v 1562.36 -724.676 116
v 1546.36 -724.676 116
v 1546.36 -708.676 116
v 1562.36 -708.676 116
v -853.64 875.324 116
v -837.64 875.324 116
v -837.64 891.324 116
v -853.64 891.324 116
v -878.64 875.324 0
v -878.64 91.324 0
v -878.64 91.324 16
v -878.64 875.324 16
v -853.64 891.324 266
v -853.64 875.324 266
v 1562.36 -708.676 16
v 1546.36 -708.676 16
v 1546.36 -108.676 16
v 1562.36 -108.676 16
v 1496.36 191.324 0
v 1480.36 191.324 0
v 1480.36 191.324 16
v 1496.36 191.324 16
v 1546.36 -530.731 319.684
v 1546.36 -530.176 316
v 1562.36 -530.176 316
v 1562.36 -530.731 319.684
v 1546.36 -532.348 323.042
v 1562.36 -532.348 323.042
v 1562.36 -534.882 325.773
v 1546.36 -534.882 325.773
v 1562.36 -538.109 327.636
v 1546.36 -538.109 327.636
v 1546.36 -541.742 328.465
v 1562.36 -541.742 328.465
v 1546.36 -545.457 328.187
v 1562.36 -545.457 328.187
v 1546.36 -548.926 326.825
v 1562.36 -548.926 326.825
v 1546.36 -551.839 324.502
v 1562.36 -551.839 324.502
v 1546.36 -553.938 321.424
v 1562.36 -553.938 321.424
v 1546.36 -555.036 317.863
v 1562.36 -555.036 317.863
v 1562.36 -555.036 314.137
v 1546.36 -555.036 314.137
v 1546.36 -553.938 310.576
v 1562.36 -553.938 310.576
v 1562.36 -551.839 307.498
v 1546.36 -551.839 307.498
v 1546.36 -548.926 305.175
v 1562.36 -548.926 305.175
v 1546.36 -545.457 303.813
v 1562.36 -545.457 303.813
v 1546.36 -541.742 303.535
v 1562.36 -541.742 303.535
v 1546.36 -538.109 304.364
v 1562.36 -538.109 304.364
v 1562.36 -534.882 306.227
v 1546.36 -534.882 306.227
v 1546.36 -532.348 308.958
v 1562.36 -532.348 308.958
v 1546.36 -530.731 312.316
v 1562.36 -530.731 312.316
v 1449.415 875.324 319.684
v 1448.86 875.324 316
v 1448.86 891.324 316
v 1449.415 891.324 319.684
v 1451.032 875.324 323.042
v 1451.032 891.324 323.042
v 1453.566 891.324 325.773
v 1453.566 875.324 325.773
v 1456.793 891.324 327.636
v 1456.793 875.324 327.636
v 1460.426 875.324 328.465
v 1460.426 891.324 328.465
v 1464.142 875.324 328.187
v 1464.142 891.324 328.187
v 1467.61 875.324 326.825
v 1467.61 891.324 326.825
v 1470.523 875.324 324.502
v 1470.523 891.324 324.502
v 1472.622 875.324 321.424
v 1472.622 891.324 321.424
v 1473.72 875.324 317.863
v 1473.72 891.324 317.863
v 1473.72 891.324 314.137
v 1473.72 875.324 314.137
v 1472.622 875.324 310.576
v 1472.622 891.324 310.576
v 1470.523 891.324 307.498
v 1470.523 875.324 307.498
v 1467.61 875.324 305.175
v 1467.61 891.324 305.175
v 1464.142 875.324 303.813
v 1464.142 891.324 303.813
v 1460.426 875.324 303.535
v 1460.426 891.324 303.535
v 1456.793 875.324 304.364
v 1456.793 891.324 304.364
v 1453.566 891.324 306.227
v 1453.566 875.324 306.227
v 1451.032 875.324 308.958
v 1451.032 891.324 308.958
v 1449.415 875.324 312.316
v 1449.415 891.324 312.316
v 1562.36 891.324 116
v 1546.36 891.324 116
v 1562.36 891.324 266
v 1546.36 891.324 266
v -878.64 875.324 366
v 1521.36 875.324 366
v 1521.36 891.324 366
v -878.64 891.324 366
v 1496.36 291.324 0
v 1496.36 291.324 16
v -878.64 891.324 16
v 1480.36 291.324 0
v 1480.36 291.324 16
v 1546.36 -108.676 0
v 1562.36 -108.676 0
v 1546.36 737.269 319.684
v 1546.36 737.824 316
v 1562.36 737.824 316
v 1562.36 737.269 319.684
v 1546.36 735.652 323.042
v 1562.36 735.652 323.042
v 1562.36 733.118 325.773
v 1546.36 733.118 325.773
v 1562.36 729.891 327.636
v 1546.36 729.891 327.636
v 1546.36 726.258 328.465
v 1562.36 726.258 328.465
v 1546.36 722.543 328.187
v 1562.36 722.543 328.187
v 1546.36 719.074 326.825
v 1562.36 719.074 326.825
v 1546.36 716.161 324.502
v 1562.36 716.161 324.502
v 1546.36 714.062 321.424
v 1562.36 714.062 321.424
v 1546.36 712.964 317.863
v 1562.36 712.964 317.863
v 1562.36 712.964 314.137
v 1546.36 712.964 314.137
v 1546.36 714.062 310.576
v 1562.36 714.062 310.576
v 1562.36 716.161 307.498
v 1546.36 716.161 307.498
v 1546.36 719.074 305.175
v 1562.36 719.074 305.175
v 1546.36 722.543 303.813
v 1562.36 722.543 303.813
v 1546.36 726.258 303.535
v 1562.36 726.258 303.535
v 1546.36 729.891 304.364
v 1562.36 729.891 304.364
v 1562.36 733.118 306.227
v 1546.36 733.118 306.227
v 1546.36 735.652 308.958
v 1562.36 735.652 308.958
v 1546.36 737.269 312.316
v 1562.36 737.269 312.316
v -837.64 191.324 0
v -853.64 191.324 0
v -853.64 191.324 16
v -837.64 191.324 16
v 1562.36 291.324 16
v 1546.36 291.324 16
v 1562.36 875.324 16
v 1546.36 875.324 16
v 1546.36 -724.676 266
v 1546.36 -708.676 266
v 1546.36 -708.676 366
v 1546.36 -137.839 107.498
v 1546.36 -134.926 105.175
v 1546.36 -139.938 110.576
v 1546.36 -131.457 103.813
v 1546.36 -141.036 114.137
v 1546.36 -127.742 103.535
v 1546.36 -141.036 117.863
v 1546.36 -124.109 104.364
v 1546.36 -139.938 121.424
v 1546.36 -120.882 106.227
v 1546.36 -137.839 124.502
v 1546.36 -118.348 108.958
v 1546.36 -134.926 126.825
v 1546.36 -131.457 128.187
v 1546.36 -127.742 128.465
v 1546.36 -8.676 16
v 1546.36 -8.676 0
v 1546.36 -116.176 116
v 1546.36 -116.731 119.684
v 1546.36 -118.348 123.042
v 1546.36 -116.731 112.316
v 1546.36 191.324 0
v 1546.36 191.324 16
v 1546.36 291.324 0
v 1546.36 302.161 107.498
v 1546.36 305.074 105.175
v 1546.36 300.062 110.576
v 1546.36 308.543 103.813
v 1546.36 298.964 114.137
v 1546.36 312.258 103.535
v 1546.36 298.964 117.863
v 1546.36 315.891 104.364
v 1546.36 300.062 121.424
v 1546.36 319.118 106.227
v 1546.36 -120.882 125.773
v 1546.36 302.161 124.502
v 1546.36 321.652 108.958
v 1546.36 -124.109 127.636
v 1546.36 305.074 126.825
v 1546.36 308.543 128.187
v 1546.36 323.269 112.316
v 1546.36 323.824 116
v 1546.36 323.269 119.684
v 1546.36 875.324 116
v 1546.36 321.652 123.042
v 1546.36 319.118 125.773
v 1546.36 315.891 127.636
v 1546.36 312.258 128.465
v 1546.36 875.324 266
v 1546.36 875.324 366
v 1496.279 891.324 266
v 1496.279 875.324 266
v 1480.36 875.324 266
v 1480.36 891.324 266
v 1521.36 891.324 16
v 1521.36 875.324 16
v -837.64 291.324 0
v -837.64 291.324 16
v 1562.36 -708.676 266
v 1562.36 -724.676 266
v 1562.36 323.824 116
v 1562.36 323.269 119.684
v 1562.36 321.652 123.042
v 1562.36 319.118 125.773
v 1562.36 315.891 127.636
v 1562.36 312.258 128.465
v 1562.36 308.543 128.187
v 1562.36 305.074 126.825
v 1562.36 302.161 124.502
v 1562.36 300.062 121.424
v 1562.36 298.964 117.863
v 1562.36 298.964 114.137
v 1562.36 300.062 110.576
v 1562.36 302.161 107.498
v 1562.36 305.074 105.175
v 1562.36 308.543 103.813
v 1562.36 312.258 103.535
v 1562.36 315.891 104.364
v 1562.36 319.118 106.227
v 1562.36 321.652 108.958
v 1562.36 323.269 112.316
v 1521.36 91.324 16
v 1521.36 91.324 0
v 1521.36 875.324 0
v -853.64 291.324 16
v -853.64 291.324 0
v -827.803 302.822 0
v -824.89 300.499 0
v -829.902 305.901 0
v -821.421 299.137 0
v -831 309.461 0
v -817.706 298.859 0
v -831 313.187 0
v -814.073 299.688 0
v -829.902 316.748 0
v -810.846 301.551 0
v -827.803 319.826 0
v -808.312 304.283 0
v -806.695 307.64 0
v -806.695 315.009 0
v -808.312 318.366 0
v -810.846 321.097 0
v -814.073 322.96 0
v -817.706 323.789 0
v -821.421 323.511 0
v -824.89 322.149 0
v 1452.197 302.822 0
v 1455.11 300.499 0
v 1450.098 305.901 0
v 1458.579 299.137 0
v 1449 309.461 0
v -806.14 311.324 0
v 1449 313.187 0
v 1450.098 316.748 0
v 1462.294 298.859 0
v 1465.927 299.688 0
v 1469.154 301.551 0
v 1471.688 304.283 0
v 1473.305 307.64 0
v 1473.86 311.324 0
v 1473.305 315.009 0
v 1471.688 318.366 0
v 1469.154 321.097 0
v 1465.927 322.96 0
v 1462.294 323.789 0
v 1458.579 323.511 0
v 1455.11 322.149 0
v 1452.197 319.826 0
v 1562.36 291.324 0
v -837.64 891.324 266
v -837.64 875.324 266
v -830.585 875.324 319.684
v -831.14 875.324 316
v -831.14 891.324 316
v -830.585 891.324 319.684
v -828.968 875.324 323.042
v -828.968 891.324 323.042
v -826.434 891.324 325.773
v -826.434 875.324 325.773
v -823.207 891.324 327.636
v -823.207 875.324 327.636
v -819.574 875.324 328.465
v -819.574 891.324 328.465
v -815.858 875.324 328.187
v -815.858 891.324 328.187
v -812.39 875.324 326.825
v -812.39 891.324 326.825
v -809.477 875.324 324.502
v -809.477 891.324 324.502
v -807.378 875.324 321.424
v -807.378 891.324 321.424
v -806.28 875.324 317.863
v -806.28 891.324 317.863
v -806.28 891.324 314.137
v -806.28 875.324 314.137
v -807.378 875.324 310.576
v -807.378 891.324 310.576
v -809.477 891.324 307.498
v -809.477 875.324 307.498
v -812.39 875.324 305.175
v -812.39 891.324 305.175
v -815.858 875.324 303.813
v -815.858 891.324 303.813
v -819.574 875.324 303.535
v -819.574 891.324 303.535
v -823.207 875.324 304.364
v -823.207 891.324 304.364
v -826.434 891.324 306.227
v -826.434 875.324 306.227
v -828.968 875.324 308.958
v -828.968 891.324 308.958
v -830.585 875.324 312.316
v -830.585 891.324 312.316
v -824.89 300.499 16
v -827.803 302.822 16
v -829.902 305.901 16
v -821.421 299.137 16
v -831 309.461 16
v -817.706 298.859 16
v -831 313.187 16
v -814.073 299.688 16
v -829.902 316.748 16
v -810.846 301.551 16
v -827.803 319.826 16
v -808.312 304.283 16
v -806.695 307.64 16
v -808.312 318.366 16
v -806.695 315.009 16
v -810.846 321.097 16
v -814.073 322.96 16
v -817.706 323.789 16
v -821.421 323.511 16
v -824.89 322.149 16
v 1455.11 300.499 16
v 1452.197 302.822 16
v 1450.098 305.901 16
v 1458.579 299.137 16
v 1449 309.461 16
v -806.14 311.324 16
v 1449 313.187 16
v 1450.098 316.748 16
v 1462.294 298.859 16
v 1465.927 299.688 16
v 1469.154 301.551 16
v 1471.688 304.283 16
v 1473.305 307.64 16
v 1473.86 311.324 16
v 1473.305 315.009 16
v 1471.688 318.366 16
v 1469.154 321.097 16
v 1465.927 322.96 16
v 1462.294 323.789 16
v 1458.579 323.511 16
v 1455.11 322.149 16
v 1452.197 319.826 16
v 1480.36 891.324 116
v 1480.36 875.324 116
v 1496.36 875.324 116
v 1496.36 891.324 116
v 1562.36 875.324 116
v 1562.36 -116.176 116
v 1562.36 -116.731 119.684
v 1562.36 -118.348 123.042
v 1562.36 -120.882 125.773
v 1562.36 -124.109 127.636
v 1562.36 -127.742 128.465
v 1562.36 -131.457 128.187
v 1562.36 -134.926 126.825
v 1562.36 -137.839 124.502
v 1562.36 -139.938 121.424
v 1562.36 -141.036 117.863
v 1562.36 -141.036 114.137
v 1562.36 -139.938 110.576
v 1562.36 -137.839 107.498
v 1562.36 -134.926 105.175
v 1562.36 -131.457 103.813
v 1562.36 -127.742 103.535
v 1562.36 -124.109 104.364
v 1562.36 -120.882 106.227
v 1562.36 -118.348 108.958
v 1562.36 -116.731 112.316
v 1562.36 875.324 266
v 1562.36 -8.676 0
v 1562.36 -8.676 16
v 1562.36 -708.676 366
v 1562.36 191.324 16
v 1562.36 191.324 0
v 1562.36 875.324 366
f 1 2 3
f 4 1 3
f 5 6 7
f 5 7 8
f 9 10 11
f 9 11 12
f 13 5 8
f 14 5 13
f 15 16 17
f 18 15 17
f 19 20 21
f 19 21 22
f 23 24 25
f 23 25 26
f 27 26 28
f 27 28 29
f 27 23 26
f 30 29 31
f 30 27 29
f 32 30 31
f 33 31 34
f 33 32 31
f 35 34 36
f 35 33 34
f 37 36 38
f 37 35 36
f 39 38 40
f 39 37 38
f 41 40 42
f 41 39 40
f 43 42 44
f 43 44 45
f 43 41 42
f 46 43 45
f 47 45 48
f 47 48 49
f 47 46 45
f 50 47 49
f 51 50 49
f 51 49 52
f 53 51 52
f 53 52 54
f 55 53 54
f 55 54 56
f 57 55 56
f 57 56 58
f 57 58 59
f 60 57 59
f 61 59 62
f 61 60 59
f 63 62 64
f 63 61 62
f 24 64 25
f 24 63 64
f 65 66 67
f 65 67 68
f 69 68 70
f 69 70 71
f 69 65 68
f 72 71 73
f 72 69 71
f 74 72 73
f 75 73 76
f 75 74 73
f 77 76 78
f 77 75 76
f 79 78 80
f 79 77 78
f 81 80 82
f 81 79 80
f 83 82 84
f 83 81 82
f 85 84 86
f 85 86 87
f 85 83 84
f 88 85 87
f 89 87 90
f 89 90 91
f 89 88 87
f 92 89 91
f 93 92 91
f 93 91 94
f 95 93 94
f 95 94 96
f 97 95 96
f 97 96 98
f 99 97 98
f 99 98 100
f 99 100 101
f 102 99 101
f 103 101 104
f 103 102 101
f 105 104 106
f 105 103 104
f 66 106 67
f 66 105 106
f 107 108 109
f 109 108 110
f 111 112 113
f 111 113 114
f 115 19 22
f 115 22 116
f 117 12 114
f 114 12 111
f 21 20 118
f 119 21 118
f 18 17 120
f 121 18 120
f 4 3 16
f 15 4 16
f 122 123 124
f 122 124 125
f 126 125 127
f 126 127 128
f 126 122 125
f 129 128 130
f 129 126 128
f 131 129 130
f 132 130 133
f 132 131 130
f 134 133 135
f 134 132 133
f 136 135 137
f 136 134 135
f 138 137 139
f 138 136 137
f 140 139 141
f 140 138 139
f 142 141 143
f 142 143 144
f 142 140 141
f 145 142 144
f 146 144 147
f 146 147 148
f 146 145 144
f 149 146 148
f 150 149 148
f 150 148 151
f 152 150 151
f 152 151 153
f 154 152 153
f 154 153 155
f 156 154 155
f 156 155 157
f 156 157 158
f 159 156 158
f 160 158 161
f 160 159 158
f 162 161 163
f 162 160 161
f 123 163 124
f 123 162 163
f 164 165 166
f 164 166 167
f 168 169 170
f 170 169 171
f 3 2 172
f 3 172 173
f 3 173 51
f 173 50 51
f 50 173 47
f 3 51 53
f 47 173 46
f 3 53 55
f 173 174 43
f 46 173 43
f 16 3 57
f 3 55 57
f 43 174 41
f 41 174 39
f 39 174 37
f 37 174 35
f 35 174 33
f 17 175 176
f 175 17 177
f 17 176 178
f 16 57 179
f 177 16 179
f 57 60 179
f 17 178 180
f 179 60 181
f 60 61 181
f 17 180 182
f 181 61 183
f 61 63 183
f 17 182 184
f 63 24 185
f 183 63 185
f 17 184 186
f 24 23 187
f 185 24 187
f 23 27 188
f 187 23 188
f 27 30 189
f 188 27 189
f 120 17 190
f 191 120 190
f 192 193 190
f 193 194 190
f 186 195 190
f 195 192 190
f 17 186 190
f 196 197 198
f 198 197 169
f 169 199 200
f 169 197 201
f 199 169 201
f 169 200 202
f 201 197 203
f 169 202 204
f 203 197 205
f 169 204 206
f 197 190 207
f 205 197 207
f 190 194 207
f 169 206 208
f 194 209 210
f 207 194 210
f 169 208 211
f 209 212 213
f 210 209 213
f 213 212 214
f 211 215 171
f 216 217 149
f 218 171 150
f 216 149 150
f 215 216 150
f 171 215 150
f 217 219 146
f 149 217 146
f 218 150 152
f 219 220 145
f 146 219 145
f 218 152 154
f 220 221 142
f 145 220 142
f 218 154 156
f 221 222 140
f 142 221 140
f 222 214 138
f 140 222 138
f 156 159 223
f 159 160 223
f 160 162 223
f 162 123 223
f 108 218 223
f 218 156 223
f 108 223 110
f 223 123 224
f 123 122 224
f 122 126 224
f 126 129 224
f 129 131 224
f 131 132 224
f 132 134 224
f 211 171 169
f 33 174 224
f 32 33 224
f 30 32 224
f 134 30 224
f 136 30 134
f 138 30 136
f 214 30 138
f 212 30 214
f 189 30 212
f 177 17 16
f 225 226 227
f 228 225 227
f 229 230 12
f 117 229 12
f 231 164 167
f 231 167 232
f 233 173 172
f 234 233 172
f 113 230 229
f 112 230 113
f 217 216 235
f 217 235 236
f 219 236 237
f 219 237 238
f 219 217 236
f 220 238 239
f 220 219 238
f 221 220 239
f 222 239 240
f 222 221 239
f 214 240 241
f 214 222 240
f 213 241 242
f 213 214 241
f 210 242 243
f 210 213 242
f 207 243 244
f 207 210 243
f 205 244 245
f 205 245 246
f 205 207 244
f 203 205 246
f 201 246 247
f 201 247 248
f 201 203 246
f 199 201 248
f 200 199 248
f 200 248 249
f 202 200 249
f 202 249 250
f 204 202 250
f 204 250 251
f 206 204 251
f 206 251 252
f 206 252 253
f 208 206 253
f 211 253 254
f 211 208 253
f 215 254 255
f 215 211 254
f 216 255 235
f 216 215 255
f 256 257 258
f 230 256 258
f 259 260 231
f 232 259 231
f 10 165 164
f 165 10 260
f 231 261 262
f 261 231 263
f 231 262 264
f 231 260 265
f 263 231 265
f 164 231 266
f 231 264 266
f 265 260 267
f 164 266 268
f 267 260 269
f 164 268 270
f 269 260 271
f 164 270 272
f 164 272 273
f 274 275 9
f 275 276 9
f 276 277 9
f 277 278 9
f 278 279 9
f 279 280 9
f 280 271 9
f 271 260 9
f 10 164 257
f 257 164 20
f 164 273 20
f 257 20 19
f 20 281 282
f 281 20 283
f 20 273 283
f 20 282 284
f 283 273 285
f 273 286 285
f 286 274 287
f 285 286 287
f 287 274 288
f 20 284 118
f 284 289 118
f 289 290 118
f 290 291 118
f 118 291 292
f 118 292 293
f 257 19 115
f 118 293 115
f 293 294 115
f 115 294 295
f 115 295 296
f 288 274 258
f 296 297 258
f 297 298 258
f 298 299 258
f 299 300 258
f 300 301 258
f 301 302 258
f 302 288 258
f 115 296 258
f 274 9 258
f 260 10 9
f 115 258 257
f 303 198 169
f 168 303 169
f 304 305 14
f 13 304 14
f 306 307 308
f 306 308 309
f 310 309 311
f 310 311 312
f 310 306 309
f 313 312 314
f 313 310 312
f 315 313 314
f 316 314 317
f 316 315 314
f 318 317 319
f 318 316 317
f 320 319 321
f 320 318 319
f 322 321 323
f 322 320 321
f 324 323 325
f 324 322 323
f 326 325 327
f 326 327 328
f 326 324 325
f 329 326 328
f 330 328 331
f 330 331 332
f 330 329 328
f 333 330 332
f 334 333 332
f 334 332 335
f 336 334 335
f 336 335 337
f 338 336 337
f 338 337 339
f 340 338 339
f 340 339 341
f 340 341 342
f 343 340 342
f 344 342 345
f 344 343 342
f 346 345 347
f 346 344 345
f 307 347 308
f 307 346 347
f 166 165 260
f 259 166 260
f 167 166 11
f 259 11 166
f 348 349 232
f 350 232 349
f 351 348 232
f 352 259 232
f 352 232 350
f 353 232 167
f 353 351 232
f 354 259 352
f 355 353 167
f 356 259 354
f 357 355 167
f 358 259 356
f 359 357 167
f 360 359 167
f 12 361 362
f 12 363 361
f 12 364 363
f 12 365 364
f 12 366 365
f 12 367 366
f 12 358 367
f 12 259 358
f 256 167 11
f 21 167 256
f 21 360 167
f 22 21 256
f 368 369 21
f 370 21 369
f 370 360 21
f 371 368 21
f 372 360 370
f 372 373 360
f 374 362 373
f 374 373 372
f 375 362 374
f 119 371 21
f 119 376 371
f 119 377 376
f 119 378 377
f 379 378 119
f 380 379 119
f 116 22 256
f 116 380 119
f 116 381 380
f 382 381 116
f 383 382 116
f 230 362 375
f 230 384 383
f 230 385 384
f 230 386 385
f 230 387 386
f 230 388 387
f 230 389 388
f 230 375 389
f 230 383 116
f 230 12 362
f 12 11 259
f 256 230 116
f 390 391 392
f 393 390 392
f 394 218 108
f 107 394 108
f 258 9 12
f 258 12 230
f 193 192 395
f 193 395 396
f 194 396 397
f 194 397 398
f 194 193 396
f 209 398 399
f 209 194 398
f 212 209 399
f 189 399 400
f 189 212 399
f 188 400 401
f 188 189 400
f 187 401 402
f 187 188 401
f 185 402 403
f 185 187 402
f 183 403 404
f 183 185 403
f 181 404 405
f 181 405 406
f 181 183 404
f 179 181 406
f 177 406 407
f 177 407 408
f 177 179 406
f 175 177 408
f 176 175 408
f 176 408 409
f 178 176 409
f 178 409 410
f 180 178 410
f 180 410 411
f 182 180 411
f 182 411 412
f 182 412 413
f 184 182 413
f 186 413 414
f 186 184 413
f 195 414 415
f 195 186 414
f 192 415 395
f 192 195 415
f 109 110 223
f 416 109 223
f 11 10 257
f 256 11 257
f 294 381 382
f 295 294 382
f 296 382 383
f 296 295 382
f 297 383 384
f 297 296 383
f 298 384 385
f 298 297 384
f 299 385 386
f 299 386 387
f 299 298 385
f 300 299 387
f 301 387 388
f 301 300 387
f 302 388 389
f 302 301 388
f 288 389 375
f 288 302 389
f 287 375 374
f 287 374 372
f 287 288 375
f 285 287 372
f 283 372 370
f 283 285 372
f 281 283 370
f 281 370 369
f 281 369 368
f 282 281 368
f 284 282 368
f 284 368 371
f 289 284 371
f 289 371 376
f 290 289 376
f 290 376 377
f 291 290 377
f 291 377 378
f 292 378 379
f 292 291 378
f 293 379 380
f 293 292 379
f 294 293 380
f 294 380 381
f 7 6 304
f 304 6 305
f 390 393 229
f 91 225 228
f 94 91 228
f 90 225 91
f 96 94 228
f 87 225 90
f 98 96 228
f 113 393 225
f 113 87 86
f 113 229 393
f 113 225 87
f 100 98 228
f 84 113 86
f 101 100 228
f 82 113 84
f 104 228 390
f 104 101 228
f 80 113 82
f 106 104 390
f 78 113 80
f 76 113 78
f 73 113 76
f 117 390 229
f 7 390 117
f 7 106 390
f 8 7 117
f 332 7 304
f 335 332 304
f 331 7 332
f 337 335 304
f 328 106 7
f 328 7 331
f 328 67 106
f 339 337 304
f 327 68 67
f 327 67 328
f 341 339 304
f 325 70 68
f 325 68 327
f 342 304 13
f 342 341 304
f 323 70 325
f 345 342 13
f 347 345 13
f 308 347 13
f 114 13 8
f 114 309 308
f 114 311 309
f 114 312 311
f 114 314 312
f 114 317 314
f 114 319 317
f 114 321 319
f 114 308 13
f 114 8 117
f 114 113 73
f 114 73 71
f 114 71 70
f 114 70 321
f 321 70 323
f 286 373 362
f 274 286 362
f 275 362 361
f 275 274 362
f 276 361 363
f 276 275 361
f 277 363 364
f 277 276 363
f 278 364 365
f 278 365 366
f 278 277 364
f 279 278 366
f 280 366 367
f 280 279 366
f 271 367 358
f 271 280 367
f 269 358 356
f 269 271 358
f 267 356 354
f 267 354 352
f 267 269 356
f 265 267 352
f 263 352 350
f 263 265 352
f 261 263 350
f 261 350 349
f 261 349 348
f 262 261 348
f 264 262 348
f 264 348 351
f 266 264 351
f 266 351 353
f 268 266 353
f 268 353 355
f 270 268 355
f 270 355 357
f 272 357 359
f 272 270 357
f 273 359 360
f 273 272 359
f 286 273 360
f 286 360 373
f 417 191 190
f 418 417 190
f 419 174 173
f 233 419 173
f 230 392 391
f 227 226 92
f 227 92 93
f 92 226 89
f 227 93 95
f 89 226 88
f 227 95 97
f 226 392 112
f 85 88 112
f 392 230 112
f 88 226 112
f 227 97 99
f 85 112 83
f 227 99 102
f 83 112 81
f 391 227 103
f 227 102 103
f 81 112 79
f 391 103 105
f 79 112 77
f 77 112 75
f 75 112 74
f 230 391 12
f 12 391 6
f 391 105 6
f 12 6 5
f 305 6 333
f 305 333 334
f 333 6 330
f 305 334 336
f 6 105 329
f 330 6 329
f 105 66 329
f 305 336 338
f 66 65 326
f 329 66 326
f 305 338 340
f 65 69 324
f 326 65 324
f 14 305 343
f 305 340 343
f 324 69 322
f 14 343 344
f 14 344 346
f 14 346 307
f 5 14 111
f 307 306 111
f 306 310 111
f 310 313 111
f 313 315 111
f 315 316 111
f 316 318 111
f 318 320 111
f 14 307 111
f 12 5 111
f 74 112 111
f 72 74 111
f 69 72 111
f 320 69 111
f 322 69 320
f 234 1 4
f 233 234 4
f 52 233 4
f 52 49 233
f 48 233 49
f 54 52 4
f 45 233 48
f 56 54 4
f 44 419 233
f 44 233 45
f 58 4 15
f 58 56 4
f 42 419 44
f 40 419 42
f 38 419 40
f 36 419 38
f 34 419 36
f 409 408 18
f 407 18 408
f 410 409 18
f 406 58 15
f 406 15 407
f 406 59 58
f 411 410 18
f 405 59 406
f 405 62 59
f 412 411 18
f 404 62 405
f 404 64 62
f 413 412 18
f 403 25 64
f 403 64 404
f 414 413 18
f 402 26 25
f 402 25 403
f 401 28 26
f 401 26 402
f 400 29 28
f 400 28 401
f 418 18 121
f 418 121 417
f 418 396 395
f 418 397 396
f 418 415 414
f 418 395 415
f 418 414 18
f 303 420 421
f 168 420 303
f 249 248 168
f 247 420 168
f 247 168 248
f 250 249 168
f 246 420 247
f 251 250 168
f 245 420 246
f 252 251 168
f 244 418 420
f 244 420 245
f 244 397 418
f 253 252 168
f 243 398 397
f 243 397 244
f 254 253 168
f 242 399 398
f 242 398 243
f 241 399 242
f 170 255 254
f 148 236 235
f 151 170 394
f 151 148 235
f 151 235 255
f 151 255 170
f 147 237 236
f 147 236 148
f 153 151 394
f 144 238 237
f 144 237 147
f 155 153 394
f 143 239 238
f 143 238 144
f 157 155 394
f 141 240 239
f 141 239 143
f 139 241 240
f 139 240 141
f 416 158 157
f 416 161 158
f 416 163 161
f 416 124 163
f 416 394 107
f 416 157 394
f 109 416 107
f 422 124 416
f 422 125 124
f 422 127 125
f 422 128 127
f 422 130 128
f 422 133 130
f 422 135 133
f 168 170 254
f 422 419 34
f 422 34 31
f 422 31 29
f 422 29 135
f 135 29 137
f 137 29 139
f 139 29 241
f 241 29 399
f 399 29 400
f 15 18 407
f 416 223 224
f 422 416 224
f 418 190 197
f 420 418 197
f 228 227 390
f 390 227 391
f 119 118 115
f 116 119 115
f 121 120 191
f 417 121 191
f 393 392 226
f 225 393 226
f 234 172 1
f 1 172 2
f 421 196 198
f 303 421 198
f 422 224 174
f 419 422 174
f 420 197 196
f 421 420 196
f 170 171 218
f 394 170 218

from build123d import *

# Parameters (mm, degrees)
F0_W     = 2400
F0_H     = 784
F0_W_2   = 16
F0_H_2   = 100
F0_R     = 12.5
F1_DEPTH = 16
F2_W     = 2400
F2_H     = 350
F2_R     = 12.5
F2_W_2   = 16
F2_H_2   = 150
F3_DEPTH = 16
F5_R     = 12.5
F6_DEPTH = 16


with BuildPart() as f1:
    # F0 (on Top) → F1 (new body)
    with BuildSketch(Plane.XY):
        with Locations((321.3600905152, 483.3240949462)):
            Rectangle(F0_W, F0_H)
        with Locations((-845.6399094848, 241.3240949462)):
            Rectangle(F0_W_2, F0_H_2, mode=Mode.SUBTRACT)
        with Locations((-818.6399094848, 311.3240949462)):
            Circle(F0_R, mode=Mode.SUBTRACT)
        with Locations((1488.3600905152, 241.3240949462)):
            Rectangle(F0_W_2, F0_H_2, mode=Mode.SUBTRACT)
        with Locations((1461.3600905152, 311.3240949462)):
            Circle(F0_R, mode=Mode.SUBTRACT)
    extrude(amount=F1_DEPTH)


with BuildPart() as f3:
    # F2 (on face) → F3 (new body)
    with BuildSketch(Plane(origin=(0, 875.3240949462, 0), x_dir=(-1, 0, 0), z_dir=(0, 1, 0))):
        with Locations((-321.3600905152, 191)):
            Rectangle(F2_W, F2_H)
        Polygon((-1480.3600905152, 266), (-1480.3600905152, 116), (-1496.3600905152, 116), (-1496.279492721, 266), align=None, mode=Mode.SUBTRACT)
        with Locations((-1461.3600905152, 316)):
            Circle(F2_R, mode=Mode.SUBTRACT)
        with Locations((845.6399094848, 191)):
            Rectangle(F2_W_2, F2_H_2, mode=Mode.SUBTRACT)
        with Locations((818.6399094848, 316)):
            Circle(F2_R, mode=Mode.SUBTRACT)
    extrude(amount=F3_DEPTH)


with BuildPart() as f6:
    # F5 (on offset) → F6 (new body)
    with BuildSketch(Plane.YZ.offset(1546.3600905152)):
        Polygon((91.3240949462, 16), (191.3240949462, 16), (191.3240949462, 0), (291.3240949462, 0), (291.3240949462, 16), (875.3240949462, 16), (875.3240949462, 116), (891.3240949462, 116), (891.3240949462, 266), (875.3240949462, 266), (875.3240949462, 366), (91.3240949462, 366), (-708.6759050538, 366), (-708.6759050538, 266), (-724.6759050538, 266), (-724.6759050538, 116), (-708.6759050538, 116), (-708.6759050538, 16), (-108.6759050538, 16), (-108.6759050538, 0), (-8.6759050538, 0), (-8.6759050538, 16), align=None)
        with Locations((-128.6759050538, 116)):
            Circle(F5_R, mode=Mode.SUBTRACT)
        with Locations((311.3240949462, 116)):
            Circle(F5_R, mode=Mode.SUBTRACT)
        with Locations((-542.6759050538, 316)):
            Circle(F5_R, mode=Mode.SUBTRACT)
        with Locations((725.3240949462, 316)):
            Circle(F5_R, mode=Mode.SUBTRACT)
    extrude(amount=F6_DEPTH)


solid = Compound([f1.part, f3.part, f6.part])
